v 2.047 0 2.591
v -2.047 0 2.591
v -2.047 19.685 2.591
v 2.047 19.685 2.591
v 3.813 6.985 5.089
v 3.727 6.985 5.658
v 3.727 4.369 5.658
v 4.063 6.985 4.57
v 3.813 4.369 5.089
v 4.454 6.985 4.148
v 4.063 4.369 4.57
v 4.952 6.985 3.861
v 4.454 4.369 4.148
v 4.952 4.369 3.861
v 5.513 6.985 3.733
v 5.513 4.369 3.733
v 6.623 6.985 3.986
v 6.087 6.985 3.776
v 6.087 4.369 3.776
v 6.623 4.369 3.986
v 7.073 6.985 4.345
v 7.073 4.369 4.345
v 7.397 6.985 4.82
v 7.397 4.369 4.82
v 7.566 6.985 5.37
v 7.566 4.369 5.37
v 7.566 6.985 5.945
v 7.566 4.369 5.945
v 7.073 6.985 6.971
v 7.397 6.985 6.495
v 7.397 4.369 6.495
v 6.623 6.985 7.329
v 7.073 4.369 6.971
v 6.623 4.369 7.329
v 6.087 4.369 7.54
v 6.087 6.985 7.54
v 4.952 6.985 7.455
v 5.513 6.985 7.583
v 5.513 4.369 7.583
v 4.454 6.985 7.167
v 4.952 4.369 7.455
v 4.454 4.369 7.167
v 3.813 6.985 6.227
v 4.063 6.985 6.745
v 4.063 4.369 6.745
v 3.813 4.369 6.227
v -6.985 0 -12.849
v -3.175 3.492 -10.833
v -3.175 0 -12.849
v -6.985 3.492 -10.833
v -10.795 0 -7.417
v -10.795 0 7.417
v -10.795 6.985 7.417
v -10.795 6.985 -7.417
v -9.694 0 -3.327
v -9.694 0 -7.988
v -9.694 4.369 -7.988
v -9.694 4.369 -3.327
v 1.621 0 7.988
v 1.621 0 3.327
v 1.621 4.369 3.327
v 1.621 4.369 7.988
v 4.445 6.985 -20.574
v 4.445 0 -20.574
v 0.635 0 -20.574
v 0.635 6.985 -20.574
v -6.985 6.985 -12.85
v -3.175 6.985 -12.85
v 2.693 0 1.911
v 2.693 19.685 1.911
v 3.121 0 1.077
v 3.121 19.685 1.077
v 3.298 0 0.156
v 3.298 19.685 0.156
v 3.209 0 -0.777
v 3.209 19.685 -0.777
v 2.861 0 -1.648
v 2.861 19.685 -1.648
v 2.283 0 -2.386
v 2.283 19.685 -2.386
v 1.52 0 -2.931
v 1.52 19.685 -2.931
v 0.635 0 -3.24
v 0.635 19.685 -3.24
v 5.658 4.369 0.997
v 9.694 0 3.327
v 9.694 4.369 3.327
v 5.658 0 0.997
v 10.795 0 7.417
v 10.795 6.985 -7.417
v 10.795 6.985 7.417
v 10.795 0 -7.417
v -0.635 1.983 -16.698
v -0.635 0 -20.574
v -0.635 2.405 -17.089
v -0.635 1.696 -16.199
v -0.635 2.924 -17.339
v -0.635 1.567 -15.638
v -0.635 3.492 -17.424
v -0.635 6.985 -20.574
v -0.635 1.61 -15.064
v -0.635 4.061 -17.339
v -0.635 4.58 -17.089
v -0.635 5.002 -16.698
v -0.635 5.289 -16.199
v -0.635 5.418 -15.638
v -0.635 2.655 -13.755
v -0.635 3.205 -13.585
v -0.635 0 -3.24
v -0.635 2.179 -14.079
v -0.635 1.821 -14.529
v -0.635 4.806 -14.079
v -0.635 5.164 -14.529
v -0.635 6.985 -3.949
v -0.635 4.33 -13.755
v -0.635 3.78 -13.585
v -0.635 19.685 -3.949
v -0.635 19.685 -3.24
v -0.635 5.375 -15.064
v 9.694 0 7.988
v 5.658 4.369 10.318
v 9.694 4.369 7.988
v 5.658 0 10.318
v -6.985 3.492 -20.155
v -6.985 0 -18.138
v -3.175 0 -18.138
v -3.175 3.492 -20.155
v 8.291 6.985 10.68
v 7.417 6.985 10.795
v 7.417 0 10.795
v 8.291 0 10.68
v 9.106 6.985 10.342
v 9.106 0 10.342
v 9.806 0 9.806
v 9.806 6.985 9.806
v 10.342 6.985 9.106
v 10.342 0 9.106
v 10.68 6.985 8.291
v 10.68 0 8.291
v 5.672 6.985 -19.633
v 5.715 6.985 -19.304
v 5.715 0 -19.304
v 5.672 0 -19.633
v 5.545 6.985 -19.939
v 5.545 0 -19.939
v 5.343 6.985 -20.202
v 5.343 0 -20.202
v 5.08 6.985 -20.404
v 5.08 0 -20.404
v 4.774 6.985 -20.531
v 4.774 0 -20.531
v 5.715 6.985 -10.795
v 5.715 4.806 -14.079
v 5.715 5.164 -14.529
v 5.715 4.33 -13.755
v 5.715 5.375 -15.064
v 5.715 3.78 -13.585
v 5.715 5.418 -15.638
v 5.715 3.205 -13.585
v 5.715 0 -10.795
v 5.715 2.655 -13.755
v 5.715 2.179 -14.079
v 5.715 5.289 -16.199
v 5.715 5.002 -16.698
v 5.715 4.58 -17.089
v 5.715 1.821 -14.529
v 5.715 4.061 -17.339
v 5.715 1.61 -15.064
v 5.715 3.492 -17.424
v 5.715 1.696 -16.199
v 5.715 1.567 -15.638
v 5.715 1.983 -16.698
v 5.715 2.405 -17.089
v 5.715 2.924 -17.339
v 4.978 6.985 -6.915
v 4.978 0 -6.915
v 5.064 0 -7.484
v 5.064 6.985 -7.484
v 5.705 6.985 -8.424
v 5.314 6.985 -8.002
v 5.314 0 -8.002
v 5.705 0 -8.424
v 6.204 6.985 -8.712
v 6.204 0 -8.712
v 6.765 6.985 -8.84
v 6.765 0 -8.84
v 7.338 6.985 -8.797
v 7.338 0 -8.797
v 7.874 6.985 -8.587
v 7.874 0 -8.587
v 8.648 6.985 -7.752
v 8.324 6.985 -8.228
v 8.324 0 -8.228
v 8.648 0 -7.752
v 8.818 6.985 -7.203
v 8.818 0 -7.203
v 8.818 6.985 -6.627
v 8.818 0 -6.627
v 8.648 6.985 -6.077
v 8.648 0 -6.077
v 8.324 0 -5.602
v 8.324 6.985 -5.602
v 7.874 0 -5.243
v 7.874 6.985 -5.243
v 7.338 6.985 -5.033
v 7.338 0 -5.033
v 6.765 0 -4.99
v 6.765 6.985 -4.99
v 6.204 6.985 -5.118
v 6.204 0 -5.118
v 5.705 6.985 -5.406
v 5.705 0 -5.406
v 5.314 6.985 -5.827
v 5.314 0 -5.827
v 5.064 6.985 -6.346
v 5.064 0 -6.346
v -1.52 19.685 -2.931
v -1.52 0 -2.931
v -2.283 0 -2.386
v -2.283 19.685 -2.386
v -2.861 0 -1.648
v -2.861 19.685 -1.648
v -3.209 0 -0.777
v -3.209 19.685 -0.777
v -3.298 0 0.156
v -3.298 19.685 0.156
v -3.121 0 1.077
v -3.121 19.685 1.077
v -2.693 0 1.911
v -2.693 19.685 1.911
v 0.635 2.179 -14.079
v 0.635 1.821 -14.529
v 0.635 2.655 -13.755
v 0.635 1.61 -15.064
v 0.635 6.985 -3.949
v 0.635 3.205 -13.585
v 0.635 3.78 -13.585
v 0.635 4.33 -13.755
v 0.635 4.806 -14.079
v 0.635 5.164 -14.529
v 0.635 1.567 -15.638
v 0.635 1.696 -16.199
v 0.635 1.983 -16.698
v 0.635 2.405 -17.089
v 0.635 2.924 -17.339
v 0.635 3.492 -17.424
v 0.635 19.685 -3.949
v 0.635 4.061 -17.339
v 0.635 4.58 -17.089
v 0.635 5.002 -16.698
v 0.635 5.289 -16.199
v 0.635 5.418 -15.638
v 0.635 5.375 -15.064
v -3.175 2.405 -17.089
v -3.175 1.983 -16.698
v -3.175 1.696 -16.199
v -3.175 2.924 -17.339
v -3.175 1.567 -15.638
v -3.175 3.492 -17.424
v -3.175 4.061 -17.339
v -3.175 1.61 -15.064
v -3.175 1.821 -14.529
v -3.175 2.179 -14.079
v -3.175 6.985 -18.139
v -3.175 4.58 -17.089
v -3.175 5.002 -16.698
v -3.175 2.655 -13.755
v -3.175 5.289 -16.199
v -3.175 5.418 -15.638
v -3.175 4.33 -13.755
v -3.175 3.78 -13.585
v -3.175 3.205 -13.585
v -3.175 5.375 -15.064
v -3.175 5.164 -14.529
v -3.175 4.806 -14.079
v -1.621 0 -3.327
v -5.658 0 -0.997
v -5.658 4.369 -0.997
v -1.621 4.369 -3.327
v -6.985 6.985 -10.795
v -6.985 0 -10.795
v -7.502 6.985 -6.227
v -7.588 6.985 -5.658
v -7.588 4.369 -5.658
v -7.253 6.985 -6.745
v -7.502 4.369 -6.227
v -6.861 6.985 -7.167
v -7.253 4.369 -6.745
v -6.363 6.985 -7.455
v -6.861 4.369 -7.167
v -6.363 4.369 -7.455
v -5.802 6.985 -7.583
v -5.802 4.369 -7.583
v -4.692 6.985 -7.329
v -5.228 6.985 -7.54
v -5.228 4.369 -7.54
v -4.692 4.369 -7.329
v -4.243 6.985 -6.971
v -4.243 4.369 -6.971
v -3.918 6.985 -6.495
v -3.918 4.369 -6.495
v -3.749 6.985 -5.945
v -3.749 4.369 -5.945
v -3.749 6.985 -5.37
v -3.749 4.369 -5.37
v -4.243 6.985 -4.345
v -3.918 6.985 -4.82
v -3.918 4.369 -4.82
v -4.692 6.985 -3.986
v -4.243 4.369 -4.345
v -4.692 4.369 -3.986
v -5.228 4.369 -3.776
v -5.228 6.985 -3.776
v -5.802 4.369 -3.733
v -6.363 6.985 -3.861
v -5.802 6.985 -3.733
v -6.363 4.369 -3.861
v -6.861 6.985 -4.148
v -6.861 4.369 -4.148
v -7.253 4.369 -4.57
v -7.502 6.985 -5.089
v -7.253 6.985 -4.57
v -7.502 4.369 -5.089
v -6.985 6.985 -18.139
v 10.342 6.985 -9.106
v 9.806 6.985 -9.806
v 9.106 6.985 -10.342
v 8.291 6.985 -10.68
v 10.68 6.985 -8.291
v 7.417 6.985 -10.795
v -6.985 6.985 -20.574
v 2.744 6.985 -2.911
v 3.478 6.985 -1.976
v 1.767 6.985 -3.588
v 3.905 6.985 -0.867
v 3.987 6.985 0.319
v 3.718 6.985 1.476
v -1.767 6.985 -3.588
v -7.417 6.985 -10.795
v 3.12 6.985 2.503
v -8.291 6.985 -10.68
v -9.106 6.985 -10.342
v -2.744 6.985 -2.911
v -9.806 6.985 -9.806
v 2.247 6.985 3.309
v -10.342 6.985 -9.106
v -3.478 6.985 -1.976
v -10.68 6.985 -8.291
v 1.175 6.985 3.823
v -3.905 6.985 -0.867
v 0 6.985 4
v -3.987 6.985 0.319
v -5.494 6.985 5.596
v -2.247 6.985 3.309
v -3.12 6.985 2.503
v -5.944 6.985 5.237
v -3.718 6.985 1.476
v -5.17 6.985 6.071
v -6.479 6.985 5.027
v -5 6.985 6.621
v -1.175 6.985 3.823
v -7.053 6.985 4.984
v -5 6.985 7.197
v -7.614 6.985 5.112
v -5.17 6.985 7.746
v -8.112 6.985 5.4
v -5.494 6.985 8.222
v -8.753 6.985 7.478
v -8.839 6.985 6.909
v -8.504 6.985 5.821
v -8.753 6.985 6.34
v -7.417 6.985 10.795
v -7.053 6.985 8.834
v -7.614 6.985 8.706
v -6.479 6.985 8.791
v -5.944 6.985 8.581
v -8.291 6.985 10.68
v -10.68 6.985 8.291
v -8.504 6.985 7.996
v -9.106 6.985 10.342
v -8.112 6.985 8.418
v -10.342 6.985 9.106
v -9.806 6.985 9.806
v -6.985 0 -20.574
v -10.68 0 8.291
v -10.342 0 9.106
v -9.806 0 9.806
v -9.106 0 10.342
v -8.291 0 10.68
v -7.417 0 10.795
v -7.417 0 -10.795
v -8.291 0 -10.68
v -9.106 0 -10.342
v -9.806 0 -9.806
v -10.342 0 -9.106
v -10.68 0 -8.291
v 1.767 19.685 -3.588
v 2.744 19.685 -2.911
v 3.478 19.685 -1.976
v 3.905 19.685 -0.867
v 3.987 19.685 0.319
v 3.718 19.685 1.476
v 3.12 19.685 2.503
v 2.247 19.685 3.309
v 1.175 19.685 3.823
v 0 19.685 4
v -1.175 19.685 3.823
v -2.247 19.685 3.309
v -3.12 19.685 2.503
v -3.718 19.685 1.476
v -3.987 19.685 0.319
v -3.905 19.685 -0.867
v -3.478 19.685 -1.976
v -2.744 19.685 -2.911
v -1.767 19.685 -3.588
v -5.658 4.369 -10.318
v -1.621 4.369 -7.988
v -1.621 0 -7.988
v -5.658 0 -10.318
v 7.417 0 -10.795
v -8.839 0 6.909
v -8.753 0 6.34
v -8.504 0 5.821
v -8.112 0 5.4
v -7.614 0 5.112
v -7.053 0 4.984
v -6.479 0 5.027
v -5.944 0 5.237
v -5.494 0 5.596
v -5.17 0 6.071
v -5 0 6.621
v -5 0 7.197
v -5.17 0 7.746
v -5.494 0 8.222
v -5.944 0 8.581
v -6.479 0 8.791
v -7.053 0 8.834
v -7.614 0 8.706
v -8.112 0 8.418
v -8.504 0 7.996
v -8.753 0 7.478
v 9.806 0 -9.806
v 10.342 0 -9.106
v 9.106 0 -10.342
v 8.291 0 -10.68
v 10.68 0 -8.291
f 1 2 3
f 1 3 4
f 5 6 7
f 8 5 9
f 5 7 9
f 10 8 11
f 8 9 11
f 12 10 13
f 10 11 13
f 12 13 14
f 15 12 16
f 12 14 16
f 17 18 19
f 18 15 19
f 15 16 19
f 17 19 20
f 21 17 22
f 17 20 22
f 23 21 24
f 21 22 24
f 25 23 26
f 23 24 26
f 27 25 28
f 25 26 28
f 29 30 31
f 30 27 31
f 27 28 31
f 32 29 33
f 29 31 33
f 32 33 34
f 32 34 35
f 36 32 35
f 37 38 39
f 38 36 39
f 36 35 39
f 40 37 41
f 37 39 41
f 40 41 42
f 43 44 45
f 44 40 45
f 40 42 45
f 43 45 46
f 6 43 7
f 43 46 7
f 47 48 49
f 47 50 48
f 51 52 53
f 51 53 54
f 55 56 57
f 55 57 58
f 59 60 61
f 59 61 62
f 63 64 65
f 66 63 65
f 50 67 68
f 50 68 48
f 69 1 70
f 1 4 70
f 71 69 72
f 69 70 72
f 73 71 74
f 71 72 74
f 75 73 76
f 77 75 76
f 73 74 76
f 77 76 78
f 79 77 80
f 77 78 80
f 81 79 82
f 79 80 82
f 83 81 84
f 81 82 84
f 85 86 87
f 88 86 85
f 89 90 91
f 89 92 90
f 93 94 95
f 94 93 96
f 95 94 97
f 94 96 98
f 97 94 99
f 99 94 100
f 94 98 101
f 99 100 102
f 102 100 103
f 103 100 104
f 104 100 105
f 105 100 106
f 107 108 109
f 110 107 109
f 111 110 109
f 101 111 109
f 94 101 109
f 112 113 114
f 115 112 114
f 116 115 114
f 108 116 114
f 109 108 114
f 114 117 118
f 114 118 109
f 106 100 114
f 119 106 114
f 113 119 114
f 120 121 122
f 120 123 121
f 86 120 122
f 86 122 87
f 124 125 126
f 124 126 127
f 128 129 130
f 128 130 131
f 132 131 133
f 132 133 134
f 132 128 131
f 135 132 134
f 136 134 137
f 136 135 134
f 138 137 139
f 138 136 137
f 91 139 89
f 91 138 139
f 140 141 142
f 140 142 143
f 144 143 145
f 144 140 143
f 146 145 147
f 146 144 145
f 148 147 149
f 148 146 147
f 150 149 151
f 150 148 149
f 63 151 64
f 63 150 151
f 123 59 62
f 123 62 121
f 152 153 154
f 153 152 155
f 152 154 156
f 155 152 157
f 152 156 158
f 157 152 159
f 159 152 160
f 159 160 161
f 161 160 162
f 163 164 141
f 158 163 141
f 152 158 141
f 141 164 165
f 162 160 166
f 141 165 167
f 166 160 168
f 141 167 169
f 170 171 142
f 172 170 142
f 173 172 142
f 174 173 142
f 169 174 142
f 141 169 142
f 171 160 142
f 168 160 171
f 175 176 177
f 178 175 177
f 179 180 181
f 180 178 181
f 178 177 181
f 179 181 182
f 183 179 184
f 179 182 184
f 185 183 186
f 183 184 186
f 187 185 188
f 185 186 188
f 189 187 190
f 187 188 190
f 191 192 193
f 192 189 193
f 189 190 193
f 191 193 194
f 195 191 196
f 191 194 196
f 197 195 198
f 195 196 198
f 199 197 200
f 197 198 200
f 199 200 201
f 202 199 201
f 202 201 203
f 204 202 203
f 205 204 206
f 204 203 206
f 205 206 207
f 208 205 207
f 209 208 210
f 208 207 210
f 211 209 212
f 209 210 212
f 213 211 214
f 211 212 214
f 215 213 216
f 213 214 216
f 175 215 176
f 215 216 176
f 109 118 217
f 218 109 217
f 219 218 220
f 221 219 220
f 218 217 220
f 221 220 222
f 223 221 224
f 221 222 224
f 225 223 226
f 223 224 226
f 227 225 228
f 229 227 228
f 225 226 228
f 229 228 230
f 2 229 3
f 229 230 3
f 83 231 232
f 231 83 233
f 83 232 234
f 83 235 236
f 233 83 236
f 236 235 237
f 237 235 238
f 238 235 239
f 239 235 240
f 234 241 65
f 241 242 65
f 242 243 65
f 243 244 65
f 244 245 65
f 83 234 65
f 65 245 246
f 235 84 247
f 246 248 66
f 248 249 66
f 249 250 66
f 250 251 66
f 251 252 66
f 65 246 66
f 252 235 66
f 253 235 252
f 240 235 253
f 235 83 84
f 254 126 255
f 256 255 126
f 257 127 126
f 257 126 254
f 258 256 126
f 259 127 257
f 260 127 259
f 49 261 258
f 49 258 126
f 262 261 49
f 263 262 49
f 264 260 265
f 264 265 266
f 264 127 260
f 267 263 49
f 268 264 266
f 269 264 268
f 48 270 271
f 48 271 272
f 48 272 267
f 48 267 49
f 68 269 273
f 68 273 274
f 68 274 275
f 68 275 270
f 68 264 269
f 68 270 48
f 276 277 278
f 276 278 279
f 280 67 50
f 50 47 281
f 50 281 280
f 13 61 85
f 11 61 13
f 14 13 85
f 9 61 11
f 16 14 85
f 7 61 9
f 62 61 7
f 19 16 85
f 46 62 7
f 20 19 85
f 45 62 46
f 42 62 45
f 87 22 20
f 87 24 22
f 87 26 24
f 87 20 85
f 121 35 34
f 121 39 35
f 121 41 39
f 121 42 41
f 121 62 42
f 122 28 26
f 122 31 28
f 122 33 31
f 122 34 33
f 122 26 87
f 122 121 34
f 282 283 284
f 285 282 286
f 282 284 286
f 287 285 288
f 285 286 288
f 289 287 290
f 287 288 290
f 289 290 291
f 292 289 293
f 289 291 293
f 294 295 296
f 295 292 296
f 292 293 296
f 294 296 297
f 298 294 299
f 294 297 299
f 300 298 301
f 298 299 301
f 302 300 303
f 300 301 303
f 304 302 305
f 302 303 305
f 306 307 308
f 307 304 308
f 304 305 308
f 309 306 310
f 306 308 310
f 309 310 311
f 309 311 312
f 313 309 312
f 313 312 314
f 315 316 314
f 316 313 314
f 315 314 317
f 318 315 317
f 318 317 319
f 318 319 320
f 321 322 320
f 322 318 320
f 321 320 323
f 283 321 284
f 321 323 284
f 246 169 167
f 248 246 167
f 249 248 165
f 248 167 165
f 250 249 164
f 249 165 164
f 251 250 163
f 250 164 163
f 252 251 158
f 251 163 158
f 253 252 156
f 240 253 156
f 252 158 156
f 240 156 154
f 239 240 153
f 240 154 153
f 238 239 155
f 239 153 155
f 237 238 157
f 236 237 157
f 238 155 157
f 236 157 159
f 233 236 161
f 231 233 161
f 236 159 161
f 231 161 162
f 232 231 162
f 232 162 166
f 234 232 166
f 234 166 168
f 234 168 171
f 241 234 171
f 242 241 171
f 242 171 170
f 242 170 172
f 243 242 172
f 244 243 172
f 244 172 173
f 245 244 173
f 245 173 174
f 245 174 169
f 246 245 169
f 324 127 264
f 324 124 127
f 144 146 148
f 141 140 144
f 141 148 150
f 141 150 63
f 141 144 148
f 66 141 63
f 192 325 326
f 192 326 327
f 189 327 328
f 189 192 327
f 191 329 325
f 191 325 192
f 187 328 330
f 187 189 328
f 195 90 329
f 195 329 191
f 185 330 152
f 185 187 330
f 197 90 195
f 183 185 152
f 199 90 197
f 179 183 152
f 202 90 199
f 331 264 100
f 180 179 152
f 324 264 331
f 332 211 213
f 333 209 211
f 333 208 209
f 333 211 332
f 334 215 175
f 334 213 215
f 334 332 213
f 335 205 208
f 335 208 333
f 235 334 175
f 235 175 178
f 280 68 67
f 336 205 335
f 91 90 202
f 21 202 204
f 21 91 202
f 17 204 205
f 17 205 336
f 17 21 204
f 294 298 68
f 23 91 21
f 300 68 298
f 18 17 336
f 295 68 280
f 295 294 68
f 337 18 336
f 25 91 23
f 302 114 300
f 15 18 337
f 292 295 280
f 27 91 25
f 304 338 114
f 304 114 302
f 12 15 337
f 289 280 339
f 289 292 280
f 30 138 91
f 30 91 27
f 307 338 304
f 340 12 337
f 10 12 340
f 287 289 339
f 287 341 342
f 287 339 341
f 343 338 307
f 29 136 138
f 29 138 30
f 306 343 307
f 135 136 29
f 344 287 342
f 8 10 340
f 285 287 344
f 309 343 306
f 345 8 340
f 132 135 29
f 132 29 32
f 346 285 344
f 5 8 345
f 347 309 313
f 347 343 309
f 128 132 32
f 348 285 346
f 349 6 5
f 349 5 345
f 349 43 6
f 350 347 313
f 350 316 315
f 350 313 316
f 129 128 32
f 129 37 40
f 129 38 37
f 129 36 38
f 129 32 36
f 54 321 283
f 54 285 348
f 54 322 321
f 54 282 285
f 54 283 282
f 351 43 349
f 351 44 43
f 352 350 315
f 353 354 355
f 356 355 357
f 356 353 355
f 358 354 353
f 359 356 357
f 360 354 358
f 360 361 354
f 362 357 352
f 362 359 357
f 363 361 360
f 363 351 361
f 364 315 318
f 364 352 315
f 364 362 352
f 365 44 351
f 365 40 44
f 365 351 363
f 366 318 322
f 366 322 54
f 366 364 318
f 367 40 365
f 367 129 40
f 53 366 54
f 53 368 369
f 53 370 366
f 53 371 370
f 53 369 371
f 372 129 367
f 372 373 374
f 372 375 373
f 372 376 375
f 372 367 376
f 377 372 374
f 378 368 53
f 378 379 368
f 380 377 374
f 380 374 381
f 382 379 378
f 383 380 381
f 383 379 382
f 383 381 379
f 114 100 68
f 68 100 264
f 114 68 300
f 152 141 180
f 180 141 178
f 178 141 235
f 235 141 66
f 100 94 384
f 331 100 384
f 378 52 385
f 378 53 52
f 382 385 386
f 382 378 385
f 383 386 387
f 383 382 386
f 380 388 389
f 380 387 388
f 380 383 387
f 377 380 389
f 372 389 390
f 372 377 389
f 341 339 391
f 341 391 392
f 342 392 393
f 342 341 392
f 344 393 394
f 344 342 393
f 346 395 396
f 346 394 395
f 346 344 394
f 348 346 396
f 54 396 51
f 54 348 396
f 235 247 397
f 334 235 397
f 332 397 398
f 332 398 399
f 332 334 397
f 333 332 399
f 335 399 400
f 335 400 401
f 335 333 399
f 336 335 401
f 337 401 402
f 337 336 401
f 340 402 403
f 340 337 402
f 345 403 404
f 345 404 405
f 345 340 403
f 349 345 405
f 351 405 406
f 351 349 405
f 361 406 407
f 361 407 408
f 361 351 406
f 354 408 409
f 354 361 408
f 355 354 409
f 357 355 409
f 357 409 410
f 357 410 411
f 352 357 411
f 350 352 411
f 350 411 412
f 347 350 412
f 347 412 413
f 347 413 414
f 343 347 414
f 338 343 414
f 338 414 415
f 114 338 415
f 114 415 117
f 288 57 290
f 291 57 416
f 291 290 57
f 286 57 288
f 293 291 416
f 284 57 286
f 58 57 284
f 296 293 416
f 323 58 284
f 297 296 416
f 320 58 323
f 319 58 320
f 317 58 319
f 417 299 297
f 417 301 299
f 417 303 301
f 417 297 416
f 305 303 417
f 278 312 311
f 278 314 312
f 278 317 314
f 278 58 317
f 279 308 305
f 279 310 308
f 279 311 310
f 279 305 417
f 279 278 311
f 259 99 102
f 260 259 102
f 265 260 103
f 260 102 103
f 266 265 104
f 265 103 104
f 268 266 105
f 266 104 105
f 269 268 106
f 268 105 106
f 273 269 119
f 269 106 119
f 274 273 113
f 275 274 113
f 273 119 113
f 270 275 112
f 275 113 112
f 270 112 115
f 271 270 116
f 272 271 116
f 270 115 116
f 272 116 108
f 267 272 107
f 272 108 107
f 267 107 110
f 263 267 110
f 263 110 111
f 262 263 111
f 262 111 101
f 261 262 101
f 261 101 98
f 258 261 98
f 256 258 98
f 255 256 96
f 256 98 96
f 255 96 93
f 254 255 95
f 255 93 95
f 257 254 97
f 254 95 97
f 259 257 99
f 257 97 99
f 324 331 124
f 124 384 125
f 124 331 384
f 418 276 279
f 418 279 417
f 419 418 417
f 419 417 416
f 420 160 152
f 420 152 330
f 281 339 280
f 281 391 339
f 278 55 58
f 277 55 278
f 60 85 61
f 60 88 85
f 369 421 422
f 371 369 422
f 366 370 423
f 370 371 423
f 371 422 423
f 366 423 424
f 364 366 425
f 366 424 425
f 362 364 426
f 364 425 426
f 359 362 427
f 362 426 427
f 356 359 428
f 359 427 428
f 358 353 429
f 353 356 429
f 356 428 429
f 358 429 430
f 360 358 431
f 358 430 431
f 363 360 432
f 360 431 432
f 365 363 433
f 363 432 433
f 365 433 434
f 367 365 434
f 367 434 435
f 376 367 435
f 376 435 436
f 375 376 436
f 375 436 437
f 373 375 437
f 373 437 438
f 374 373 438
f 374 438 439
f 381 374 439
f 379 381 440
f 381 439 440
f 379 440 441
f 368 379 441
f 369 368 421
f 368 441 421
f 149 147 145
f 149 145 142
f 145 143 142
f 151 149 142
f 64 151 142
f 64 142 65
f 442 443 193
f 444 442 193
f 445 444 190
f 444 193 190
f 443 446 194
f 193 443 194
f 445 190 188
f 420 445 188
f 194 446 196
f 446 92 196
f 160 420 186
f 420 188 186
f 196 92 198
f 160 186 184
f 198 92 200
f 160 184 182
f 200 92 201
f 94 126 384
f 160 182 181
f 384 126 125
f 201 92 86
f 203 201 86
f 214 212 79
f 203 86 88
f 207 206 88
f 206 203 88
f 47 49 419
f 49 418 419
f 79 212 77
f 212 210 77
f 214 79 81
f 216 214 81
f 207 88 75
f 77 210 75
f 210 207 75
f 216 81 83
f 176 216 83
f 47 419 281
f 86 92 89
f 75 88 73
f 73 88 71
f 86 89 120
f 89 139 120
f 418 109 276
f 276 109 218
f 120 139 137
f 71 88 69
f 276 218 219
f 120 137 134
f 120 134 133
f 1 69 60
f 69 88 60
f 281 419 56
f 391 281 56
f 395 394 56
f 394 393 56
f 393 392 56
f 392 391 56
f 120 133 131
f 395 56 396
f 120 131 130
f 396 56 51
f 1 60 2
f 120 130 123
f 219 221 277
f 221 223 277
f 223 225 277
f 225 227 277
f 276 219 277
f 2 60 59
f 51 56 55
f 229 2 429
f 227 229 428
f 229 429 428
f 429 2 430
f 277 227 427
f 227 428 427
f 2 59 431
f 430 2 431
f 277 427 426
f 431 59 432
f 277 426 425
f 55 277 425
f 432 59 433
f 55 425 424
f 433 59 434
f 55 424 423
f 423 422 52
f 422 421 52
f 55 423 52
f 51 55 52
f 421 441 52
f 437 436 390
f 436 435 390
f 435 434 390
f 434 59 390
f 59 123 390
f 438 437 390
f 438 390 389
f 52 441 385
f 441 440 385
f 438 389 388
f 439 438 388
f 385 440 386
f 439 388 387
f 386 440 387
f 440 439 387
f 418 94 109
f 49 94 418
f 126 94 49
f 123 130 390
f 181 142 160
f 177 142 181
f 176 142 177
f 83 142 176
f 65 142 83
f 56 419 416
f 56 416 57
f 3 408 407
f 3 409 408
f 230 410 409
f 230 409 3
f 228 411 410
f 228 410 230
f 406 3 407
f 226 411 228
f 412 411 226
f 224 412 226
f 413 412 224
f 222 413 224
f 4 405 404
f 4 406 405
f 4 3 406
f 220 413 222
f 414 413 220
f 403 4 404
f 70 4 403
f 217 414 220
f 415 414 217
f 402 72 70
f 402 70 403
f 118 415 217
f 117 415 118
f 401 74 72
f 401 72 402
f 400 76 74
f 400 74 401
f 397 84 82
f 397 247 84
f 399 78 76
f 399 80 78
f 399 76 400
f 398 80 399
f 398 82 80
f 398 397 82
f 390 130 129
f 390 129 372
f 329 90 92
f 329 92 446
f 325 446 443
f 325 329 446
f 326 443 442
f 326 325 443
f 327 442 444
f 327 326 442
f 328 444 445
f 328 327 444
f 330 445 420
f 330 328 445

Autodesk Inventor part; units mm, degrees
ref_plane "YZ Plane" through (0, 0, 0) normal (1, 0, 0) x (0, 1, 0)
ref_plane "XZ Plane" through (0, 0, 0) normal (0, 1, 0) x (-1, 0, 0)
ref_plane "XY Plane" through (0, 0, 0) normal (0, 0, 1) x (1, 0, 0)
sketch "Sketch1" plane through (0, 0, 0) normal (0, 1, 0) x (-1, 0, 0)
  line L0 (-10.795, 10.795) -> (10.795, 10.795)
  line L1 (10.795, 10.795) -> (10.795, -10.795)
  line L2 (-10.795, -10.795) -> (-10.795, 10.795)
  circle A0 centre (5.6576, -5.6576) radius 1.9304
  circle A1 centre (6.9088, 6.9088) radius 1.9304
  circle A2 centre (-5.6576, 5.6576) radius 1.9304
  circle A3 centre (-6.9088, -6.9148) radius 1.9304
  line L3 (-5.715, -10.795) -> (-5.715, -20.574)
  line L4 (-5.715, -20.574) -> (6.985, -20.574)
  line L5 (6.985, -20.574) -> (6.985, -10.795)
  line L6 (10.795, -10.795) -> (6.985, -10.795)
  line L7 (-5.715, -10.795) -> (-10.795, -10.795)
  point P0 (0, 0)
  dimension "d2" = 10.795
  dimension "d3" = 10.795
  dimension "d4" = 3.8608
  dimension "d5" = 5.6576
  dimension "d6" = 5.6576
  dimension "d7" = 3.8608
  dimension "d8" = 6.9088
  dimension "d9" = 6.9088
  dimension "d10" = 3.8608
  dimension "d11" = 5.6576
  dimension "d12" = 5.6576
  dimension "d13" = 3.8608
  dimension "d14" = 12.7
  dimension "d16" = 6.985
  dimension "d45" = 10.795
  dimension "d46" = 10.795
  dimension "d47" = 10.795
extrude "Extrusion1" add sketch "Sketch1" along normal blind 6.985
sketch "Sketch2" plane through (-6.985, 0, -20.574) normal (-1, 0, 0) x (0, 0, 1)
  circle A0 centre (5.08, 3.4925) radius 4.6609 construction
  line L0 (9.779, 0) -> (0, 0) projected
  line L1 (0, 0) -> (0, 6.985) projected
  line L2 (9.7409, 3.4925) -> (7.4105, -0.544)
  line L3 (7.4105, -0.544) -> (2.7496, -0.544)
  line L4 (2.7496, -0.544) -> (0.4191, 3.4925)
  line L5 (0.4191, 3.4925) -> (2.7495, 7.529)
  line L6 (2.7495, 7.529) -> (7.4104, 7.529)
  line L7 (7.4104, 7.529) -> (9.7409, 3.4925)
  point P0 (20.574, 0)
  dimension "d19" = 9.3218
  dimension "d20" = 3.4925
  dimension "d21" = 5.08
extrude "Extrusion2" cut sketch "Sketch2" against normal blind 3.81
sketch "Sketch3" plane through (5.715, 0, -10.795) normal (1, 0, 0) x (0, 0, -1)
  circle A0 centre (4.699, 3.4925) radius 1.9304
  line L0 (9.779, 0) -> (9.779, 6.985) projected
  line L1 (0, 6.985) -> (9.779, 6.985) projected
  point P0 (-10.795, 0)
  dimension "d24" = 3.8608
  dimension "d25" = 5.08
  dimension "d26" = 3.4925
extrude "Extrusion3" cut sketch "Sketch3" against normal through all
sketch "Sketch4" plane through (0, 6.985, 0) normal (0, 1, 0) x (1, 0, 0)
  circle A0 centre (0, 0) radius 4
  dimension "d29" = 8
extrude "Extrusion4" add sketch "Sketch4" along normal blind 12.7
sketch "Sketch5" plane through (0, 19.685, 0) normal (0, 1, 0) x (1, 0, 0)
  arc A0 (2.0472, -2.5908) -> (-2.0472, -2.5908) centre (0, 0) ccw
  line L0 (-2.0472, -2.5908) -> (2.0472, -2.5908)
  dimension "d32" = 6.604
  dimension "d33" = 2.5908
fillet "Fillet1" radius 3.3782 4 edges at (10.795, 3.4925, 10.795) (10.795, 3.4925, -10.795) (-10.795, 3.4925, 10.795) (-10.795, 3.4925, -10.795)
extrude "Extrusion5" cut sketch "Sketch5" against normal through all
sketch "Sketch6" plane through (0, 19.685, 0) normal (0, 1, 0) x (1, 0, 0)
  line L0 (-6.985, 20.574) -> (5.715, 20.574) projected
  line L1 (0.635, 0) -> (0.635, 20.574)
  line L2 (0.635, 20.574) -> (-0.635, 20.574)
  line L3 (-0.635, 20.574) -> (-0.635, 0)
  line L4 (-0.635, -20.574) -> (0.635, 20.574) construction
  line L5 (0.635, -20.574) -> (-0.635, 20.574) construction
  line L6 (-0.635, 0) -> (0.635, 0)
  point P0 (0, 0)
  dimension "d37" = 1.27
extrude "Extrusion6" cut sketch "Sketch6" against normal through all
sketch "Sketch7" plane through (0, 0, 0) normal (0, -1, 0) x (1, 0, 0)
  circle A0 centre (-5.6576, -5.6576) radius 1.9304 projected
  circle A1 centre (-5.6576, -5.6576) radius 4.6609 construction
  circle A2 centre (5.6576, 5.6576) radius 1.9304 projected
  circle A3 centre (5.6576, 5.6576) radius 4.6609 construction
  line L0 (-5.6576, -0.9967) -> (-1.6211, -3.3271)
  line L1 (-1.6211, -3.3271) -> (-1.6211, -7.988)
  line L2 (-1.6211, -7.988) -> (-5.6576, -10.3185)
  line L3 (-5.6576, -10.3185) -> (-9.694, -7.988)
  line L4 (-9.694, -7.988) -> (-9.694, -3.3271)
  line L5 (-9.694, -3.3271) -> (-5.6576, -0.9967)
  line L6 (5.6576, 0.9967) -> (1.6211, 3.3271)
  line L7 (1.6211, 3.3271) -> (1.6211, 7.988)
  line L8 (1.6211, 7.988) -> (5.6576, 10.3185)
  line L9 (5.6576, 10.3185) -> (9.694, 7.988)
  line L10 (9.694, 7.988) -> (9.694, 3.3271)
  line L11 (9.694, 3.3271) -> (5.6576, 0.9967)
  point P0 (0, 0)
  dimension "d40" = 9.3218
  dimension "d41" = 9.3218
extrude "Extrusion7" cut sketch "Sketch7" against normal blind 4.3688
fillet "Fillet2" radius 1.27 1 edges at (5.715, 3.4925, -20.574)
properties part number "clamping hub .25 in to 8mm hub"
